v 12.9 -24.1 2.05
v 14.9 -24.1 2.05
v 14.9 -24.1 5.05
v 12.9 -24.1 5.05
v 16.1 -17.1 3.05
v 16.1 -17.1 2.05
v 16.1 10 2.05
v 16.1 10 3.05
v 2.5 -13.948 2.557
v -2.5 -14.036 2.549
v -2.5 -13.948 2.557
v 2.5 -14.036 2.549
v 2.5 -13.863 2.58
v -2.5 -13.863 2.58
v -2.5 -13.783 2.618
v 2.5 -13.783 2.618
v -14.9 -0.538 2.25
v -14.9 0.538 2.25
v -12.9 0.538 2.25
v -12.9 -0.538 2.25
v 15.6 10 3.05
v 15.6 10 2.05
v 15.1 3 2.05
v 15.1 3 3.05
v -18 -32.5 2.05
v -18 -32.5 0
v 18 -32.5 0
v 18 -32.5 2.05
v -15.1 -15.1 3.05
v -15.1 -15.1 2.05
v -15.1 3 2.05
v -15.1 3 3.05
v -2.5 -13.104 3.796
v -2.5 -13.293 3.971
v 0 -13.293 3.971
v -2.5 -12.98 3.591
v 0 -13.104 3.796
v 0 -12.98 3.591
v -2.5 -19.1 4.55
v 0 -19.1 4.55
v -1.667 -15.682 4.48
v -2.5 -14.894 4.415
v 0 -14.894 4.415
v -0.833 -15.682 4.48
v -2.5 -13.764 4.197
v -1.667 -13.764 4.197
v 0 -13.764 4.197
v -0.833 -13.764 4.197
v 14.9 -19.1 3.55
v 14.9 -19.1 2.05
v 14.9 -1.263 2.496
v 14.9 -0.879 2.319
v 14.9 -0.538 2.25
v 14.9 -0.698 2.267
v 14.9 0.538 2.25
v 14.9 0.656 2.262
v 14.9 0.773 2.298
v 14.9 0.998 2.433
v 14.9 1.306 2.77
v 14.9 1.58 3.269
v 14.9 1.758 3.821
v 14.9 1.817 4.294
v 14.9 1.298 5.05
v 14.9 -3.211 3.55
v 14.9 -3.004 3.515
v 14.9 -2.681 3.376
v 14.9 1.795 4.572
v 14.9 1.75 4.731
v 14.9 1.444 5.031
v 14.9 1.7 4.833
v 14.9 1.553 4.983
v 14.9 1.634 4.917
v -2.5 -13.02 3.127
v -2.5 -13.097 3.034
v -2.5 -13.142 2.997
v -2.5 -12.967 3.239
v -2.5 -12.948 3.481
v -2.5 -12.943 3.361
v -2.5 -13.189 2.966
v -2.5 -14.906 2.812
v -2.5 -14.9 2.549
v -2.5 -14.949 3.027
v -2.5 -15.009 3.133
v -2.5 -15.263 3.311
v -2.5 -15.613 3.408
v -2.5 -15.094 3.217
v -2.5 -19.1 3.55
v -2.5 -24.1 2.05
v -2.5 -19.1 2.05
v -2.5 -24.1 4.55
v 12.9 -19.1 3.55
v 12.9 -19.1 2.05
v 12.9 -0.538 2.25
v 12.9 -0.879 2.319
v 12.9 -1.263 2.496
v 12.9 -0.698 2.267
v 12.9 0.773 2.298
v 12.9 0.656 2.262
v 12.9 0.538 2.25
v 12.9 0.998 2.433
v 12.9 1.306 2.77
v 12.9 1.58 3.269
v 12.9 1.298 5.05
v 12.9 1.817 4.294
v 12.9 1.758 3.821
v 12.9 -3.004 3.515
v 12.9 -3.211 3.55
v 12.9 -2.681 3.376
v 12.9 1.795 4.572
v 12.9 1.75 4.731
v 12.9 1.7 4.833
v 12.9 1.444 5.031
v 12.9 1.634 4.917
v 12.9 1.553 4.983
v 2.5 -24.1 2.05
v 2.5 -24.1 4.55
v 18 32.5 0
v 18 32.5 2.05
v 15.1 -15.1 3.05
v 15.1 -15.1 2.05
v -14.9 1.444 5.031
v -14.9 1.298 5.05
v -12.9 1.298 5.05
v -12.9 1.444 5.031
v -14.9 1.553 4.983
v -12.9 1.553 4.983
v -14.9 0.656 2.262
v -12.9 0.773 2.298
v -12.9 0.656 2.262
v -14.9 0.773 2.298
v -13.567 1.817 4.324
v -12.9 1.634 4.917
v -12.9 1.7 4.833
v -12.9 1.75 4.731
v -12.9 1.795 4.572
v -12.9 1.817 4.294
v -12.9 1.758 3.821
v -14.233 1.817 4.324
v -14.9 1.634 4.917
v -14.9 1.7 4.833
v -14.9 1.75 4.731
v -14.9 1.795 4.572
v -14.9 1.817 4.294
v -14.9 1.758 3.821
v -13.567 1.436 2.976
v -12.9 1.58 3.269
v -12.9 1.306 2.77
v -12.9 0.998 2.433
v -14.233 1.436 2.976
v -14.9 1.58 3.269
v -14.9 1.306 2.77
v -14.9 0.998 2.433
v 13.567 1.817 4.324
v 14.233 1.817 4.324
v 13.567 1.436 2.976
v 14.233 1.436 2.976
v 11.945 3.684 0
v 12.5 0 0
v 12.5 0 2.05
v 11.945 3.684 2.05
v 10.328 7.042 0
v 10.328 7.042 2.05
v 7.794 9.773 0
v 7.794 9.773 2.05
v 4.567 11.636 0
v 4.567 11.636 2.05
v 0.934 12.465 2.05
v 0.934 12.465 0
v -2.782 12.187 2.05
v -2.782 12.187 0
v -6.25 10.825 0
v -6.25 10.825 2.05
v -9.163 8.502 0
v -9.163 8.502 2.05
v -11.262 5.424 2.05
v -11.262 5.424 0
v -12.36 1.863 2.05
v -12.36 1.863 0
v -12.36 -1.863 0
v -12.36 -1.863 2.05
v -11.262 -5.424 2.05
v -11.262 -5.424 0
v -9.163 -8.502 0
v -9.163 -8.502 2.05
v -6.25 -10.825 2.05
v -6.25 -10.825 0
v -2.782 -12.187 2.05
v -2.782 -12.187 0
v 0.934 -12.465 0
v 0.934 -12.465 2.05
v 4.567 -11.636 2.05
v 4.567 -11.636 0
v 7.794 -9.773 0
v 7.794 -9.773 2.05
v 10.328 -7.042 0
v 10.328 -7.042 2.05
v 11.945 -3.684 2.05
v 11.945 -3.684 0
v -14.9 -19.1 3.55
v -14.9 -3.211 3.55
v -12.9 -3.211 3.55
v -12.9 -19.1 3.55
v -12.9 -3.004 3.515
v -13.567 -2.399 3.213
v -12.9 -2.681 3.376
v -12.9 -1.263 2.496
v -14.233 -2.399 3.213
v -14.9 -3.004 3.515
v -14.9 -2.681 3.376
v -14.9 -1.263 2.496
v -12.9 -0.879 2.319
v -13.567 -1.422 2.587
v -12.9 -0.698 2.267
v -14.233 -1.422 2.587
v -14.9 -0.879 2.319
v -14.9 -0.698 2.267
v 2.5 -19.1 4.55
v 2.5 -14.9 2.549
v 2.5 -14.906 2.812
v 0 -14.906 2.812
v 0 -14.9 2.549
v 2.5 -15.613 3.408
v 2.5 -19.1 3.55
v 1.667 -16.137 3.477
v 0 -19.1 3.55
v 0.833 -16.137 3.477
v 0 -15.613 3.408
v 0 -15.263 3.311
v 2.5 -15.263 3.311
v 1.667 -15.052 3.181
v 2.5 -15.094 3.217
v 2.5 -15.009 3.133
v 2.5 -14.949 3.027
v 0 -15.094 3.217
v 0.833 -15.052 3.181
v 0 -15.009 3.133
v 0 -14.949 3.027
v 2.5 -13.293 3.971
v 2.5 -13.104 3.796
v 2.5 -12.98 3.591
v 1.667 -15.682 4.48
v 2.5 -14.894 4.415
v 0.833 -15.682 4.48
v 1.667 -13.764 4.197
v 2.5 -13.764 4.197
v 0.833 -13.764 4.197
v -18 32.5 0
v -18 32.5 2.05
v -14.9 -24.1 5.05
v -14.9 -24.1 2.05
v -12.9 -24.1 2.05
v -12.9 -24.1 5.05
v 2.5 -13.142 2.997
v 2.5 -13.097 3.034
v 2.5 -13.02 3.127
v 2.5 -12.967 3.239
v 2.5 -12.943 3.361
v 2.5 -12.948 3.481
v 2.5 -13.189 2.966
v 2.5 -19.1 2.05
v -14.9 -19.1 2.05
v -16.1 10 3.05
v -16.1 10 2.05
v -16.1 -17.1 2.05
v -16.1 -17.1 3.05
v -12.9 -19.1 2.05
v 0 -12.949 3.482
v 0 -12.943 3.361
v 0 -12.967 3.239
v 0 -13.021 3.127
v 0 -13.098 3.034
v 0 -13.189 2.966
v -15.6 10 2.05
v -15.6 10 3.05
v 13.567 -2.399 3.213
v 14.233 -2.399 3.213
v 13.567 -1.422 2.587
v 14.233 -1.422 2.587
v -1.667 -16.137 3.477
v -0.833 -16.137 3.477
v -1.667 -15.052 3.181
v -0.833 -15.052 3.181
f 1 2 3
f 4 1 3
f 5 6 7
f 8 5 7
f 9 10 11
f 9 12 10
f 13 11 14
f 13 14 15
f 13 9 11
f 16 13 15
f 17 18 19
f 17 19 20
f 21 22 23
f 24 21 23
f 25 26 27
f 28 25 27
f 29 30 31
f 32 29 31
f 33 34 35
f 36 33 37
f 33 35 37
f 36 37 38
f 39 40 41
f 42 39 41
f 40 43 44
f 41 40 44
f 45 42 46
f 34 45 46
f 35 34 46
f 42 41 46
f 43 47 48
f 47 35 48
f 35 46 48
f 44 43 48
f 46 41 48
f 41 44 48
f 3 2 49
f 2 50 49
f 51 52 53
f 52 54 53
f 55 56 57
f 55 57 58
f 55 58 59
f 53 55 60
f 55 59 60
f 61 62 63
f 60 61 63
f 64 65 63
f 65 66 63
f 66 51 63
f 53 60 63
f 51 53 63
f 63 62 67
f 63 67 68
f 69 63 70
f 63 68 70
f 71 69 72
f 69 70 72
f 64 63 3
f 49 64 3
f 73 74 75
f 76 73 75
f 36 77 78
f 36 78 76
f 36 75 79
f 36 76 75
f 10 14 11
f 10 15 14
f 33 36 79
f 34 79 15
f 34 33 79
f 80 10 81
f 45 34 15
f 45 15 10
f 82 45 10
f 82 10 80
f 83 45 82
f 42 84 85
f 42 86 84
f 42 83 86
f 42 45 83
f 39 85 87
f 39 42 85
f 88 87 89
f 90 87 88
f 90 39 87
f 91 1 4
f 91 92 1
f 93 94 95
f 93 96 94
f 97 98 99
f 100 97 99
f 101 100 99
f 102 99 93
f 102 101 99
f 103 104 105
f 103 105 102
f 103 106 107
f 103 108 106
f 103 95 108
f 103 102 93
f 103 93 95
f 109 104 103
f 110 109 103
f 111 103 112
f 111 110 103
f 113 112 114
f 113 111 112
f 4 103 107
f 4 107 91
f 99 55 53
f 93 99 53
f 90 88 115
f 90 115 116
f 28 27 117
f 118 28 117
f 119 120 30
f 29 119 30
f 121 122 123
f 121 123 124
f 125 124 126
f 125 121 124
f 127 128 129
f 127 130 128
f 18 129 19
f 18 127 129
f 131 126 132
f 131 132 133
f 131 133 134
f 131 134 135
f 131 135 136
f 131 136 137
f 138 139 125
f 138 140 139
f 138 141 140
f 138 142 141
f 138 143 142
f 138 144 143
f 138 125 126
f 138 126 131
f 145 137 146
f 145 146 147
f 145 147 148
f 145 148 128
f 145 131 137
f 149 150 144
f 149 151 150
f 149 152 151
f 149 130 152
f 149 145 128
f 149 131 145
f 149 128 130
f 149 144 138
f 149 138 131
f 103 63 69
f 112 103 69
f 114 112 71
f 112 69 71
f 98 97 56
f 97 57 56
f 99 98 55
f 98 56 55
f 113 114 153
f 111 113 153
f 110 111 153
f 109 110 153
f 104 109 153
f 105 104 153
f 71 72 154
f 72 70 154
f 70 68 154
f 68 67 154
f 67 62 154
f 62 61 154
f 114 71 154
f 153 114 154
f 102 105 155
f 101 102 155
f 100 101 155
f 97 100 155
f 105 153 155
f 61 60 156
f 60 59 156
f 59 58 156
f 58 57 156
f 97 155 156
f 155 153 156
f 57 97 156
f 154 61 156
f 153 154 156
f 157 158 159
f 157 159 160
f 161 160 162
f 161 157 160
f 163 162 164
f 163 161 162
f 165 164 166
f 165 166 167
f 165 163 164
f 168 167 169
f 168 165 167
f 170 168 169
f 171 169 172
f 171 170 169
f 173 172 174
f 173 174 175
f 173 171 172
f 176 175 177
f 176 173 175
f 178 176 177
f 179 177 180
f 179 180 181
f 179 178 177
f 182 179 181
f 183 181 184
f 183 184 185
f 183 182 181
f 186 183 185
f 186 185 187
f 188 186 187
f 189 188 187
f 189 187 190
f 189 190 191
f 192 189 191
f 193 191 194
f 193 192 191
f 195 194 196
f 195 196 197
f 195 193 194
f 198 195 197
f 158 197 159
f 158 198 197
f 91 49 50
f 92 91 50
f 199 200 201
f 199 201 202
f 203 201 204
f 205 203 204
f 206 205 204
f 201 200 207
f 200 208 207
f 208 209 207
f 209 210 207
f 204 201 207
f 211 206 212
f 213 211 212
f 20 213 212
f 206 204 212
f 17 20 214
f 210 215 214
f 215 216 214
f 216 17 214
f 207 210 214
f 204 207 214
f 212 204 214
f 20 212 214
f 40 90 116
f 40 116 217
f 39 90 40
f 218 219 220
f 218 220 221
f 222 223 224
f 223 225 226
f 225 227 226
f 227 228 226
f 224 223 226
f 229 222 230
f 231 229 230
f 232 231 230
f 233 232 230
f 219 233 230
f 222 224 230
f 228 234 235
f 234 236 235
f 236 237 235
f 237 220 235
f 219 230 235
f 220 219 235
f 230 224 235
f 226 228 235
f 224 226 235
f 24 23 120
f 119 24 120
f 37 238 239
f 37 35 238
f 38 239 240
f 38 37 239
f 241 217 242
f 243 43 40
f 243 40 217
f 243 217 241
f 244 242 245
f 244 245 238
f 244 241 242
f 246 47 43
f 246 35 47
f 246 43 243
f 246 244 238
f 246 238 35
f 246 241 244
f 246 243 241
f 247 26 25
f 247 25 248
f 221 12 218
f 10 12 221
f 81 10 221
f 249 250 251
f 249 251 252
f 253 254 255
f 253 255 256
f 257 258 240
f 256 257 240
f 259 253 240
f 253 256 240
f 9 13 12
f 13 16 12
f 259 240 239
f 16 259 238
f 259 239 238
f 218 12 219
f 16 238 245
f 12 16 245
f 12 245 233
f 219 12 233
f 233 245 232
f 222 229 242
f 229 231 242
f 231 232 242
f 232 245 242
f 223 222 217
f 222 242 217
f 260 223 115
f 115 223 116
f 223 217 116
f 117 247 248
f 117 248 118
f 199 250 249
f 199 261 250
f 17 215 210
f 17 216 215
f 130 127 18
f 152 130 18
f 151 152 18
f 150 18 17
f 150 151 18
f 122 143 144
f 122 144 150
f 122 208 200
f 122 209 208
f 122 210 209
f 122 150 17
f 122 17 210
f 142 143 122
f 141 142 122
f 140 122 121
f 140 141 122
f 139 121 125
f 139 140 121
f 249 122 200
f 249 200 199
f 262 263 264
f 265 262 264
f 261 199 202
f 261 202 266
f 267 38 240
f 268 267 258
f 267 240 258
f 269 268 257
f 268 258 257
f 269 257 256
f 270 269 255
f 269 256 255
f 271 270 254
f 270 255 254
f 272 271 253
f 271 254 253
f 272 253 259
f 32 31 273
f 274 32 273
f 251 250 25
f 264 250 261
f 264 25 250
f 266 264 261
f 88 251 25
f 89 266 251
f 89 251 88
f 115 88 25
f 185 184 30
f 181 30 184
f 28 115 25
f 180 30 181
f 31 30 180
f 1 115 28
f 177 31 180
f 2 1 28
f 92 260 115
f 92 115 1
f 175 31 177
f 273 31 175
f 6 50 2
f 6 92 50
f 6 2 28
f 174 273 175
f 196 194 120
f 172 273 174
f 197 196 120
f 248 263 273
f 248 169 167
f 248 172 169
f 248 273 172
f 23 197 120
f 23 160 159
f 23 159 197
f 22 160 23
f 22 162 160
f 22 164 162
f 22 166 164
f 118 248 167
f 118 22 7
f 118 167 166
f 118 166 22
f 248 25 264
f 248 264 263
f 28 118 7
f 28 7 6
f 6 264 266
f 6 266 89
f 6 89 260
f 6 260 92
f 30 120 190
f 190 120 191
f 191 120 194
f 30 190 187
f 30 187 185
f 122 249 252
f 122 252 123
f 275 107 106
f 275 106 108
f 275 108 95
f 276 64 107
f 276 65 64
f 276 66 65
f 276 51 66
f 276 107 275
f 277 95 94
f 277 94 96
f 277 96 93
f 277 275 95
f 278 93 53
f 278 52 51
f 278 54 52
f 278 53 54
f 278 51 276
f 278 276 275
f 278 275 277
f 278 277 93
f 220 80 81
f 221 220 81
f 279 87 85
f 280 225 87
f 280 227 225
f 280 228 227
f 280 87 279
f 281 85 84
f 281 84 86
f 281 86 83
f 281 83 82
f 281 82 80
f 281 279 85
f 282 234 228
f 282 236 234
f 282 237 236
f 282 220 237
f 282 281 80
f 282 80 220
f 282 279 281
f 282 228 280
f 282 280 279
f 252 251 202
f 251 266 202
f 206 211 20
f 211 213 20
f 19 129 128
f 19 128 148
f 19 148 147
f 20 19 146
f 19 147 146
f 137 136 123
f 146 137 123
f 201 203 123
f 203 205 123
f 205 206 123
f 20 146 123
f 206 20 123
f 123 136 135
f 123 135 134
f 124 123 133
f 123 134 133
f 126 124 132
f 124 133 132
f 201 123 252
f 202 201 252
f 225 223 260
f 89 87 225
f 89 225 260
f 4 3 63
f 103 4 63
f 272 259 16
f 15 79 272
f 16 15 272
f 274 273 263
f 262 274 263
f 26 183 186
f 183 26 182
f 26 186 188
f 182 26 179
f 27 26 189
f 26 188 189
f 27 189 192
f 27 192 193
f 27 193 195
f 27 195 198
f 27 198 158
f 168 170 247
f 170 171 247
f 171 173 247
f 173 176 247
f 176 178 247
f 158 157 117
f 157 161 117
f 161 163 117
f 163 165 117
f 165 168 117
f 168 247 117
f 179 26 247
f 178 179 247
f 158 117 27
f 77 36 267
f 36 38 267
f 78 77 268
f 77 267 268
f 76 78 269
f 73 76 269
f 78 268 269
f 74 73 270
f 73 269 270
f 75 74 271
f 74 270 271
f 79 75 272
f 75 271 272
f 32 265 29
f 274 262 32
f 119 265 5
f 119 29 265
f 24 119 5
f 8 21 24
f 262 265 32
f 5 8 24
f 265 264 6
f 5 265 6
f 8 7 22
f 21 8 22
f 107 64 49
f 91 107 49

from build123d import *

# Parameters (mm, degrees)
MAIN_FEATURES_SKETCH_W = 36
MAIN_FEATURES_SKETCH_H = 65
MAIN_FEATURES_SKETCH_R = 12.5
BASE_FILTER_DEPTH      = 2.05
LENS_SURROUND_DEPTH    = 3.05
ARM_DEPTH              = 2.5
FILLET1_R              = 0.5
LONG_ARM_START         = 0.2
LONG_ARM_DEPTH         = 2


with BuildPart() as part:
    # main_features_sketch → base_filter (new body)
    with BuildSketch(Plane.XY):
        Rectangle(MAIN_FEATURES_SKETCH_W, MAIN_FEATURES_SKETCH_H)
        Circle(MAIN_FEATURES_SKETCH_R, mode=Mode.SUBTRACT)
    extrude(amount=BASE_FILTER_DEPTH)

    # main_features_sketch<4> → lens_surround (add)
    with BuildSketch(Plane.XY):
        Polygon((-16.1, 10), (-16.1, 0), (-16.1, -17.1), (16.1, -17.1), (16.1, 0), (16.1, 10), (15.6, 10), (15.1, 3), (15.1, 0), (15.1, -15.1), (-15.1, -15.1), (-15.1, 0), (-15.1, 3), (-15.6, 10), align=None)
    extrude(amount=LENS_SURROUND_DEPTH)

    # arm_sketch → arm (add, symmetric)
    with BuildSketch(Plane(origin=(0, 0, 0), x_dir=(0, -1, 0), z_dir=(-1, 0, 0))):
        with BuildLine():
            Line((13.9, 2.549398771), (14.9, 2.549398771))
            add(Edge.make_bspline(
                [(19.1, 3.55), (14.882914348, 3.55), (14.9, 3.386309971), (14.9, 2.549398771)],
                knots=[0, 0, 0, 0, 1, 1, 1, 1], degree=3))
            Line((19.1, 3.55), (19.1, 2.05))
            Line((19.1, 2.05), (24.1, 2.05))
            Line((24.1, 2.05), (24.1, 3.55))
            Line((24.1, 3.55), (24.1, 4.55))
            Line((24.1, 4.55), (19.1, 4.55))
            add(Edge.make_bspline(
                [(19.1, 4.55), (14.0970617, 4.55), (12.9, 4.338647065), (12.9, 3.134725983)],
                knots=[0, 0, 0, 0, 1, 1, 1, 1], degree=3))
            Line((12.9, 3.134725983), (13.9, 2.549398771))
        make_face()
    extrude(amount=ARM_DEPTH, both=True)

    # Fillet1
    fillet1_edges = [part.edges().sort_by_distance(p)[0] for p in [
        (1.25, -12.9, 3.134725983),
        (0, -13.9, 2.549398771),
    ]]
    fillet(fillet1_edges, radius=FILLET1_R)

    # long_arm_sketch → long_arm (add)
    with BuildSketch(Plane(origin=(-15.1, 0, 0), x_dir=(0, 0, -1), z_dir=(1, 0, 0)).offset(LONG_ARM_START)):
        with BuildLine():
            Line((-2.05, -24.1), (-5.05, -24.1))
            Line((-5.05, -24.1), (-5.05, 1.297726723))
            add(Edge.make_bspline(
                [(-5.05, 1.297726723), (-5.05, 2.39434011), (-2.25, 1.5663534), (-2.25, 0.537583105)],
                knots=[0, 0, 0, 0, 1, 1, 1, 1], degree=3))
            Line((-2.25, 0.537583105), (-2.25, -0.537583105))
            add(Edge.make_bspline(
                [(-3.55, -3.211240123), (-3.55, -2.566791116), (-2.25, -1.290352393), (-2.25, -0.537583105)],
                knots=[0, 0, 0, 0, 1, 1, 1, 1], degree=3))
            Line((-3.55, -3.211240123), (-3.55, -19.1))
            Line((-3.55, -19.1), (-2.05, -19.1))
            Line((-2.05, -19.1), (-2.05, -24.1))
        make_face()
    long_arm = extrude(amount=LONG_ARM_DEPTH)

    # Mirror1: long_arm across plane
    add(long_arm.mirror(Plane(origin=(0, 0, 0), x_dir=(0, 0, 1), z_dir=(1, 0, 0))))


solid = part.part
